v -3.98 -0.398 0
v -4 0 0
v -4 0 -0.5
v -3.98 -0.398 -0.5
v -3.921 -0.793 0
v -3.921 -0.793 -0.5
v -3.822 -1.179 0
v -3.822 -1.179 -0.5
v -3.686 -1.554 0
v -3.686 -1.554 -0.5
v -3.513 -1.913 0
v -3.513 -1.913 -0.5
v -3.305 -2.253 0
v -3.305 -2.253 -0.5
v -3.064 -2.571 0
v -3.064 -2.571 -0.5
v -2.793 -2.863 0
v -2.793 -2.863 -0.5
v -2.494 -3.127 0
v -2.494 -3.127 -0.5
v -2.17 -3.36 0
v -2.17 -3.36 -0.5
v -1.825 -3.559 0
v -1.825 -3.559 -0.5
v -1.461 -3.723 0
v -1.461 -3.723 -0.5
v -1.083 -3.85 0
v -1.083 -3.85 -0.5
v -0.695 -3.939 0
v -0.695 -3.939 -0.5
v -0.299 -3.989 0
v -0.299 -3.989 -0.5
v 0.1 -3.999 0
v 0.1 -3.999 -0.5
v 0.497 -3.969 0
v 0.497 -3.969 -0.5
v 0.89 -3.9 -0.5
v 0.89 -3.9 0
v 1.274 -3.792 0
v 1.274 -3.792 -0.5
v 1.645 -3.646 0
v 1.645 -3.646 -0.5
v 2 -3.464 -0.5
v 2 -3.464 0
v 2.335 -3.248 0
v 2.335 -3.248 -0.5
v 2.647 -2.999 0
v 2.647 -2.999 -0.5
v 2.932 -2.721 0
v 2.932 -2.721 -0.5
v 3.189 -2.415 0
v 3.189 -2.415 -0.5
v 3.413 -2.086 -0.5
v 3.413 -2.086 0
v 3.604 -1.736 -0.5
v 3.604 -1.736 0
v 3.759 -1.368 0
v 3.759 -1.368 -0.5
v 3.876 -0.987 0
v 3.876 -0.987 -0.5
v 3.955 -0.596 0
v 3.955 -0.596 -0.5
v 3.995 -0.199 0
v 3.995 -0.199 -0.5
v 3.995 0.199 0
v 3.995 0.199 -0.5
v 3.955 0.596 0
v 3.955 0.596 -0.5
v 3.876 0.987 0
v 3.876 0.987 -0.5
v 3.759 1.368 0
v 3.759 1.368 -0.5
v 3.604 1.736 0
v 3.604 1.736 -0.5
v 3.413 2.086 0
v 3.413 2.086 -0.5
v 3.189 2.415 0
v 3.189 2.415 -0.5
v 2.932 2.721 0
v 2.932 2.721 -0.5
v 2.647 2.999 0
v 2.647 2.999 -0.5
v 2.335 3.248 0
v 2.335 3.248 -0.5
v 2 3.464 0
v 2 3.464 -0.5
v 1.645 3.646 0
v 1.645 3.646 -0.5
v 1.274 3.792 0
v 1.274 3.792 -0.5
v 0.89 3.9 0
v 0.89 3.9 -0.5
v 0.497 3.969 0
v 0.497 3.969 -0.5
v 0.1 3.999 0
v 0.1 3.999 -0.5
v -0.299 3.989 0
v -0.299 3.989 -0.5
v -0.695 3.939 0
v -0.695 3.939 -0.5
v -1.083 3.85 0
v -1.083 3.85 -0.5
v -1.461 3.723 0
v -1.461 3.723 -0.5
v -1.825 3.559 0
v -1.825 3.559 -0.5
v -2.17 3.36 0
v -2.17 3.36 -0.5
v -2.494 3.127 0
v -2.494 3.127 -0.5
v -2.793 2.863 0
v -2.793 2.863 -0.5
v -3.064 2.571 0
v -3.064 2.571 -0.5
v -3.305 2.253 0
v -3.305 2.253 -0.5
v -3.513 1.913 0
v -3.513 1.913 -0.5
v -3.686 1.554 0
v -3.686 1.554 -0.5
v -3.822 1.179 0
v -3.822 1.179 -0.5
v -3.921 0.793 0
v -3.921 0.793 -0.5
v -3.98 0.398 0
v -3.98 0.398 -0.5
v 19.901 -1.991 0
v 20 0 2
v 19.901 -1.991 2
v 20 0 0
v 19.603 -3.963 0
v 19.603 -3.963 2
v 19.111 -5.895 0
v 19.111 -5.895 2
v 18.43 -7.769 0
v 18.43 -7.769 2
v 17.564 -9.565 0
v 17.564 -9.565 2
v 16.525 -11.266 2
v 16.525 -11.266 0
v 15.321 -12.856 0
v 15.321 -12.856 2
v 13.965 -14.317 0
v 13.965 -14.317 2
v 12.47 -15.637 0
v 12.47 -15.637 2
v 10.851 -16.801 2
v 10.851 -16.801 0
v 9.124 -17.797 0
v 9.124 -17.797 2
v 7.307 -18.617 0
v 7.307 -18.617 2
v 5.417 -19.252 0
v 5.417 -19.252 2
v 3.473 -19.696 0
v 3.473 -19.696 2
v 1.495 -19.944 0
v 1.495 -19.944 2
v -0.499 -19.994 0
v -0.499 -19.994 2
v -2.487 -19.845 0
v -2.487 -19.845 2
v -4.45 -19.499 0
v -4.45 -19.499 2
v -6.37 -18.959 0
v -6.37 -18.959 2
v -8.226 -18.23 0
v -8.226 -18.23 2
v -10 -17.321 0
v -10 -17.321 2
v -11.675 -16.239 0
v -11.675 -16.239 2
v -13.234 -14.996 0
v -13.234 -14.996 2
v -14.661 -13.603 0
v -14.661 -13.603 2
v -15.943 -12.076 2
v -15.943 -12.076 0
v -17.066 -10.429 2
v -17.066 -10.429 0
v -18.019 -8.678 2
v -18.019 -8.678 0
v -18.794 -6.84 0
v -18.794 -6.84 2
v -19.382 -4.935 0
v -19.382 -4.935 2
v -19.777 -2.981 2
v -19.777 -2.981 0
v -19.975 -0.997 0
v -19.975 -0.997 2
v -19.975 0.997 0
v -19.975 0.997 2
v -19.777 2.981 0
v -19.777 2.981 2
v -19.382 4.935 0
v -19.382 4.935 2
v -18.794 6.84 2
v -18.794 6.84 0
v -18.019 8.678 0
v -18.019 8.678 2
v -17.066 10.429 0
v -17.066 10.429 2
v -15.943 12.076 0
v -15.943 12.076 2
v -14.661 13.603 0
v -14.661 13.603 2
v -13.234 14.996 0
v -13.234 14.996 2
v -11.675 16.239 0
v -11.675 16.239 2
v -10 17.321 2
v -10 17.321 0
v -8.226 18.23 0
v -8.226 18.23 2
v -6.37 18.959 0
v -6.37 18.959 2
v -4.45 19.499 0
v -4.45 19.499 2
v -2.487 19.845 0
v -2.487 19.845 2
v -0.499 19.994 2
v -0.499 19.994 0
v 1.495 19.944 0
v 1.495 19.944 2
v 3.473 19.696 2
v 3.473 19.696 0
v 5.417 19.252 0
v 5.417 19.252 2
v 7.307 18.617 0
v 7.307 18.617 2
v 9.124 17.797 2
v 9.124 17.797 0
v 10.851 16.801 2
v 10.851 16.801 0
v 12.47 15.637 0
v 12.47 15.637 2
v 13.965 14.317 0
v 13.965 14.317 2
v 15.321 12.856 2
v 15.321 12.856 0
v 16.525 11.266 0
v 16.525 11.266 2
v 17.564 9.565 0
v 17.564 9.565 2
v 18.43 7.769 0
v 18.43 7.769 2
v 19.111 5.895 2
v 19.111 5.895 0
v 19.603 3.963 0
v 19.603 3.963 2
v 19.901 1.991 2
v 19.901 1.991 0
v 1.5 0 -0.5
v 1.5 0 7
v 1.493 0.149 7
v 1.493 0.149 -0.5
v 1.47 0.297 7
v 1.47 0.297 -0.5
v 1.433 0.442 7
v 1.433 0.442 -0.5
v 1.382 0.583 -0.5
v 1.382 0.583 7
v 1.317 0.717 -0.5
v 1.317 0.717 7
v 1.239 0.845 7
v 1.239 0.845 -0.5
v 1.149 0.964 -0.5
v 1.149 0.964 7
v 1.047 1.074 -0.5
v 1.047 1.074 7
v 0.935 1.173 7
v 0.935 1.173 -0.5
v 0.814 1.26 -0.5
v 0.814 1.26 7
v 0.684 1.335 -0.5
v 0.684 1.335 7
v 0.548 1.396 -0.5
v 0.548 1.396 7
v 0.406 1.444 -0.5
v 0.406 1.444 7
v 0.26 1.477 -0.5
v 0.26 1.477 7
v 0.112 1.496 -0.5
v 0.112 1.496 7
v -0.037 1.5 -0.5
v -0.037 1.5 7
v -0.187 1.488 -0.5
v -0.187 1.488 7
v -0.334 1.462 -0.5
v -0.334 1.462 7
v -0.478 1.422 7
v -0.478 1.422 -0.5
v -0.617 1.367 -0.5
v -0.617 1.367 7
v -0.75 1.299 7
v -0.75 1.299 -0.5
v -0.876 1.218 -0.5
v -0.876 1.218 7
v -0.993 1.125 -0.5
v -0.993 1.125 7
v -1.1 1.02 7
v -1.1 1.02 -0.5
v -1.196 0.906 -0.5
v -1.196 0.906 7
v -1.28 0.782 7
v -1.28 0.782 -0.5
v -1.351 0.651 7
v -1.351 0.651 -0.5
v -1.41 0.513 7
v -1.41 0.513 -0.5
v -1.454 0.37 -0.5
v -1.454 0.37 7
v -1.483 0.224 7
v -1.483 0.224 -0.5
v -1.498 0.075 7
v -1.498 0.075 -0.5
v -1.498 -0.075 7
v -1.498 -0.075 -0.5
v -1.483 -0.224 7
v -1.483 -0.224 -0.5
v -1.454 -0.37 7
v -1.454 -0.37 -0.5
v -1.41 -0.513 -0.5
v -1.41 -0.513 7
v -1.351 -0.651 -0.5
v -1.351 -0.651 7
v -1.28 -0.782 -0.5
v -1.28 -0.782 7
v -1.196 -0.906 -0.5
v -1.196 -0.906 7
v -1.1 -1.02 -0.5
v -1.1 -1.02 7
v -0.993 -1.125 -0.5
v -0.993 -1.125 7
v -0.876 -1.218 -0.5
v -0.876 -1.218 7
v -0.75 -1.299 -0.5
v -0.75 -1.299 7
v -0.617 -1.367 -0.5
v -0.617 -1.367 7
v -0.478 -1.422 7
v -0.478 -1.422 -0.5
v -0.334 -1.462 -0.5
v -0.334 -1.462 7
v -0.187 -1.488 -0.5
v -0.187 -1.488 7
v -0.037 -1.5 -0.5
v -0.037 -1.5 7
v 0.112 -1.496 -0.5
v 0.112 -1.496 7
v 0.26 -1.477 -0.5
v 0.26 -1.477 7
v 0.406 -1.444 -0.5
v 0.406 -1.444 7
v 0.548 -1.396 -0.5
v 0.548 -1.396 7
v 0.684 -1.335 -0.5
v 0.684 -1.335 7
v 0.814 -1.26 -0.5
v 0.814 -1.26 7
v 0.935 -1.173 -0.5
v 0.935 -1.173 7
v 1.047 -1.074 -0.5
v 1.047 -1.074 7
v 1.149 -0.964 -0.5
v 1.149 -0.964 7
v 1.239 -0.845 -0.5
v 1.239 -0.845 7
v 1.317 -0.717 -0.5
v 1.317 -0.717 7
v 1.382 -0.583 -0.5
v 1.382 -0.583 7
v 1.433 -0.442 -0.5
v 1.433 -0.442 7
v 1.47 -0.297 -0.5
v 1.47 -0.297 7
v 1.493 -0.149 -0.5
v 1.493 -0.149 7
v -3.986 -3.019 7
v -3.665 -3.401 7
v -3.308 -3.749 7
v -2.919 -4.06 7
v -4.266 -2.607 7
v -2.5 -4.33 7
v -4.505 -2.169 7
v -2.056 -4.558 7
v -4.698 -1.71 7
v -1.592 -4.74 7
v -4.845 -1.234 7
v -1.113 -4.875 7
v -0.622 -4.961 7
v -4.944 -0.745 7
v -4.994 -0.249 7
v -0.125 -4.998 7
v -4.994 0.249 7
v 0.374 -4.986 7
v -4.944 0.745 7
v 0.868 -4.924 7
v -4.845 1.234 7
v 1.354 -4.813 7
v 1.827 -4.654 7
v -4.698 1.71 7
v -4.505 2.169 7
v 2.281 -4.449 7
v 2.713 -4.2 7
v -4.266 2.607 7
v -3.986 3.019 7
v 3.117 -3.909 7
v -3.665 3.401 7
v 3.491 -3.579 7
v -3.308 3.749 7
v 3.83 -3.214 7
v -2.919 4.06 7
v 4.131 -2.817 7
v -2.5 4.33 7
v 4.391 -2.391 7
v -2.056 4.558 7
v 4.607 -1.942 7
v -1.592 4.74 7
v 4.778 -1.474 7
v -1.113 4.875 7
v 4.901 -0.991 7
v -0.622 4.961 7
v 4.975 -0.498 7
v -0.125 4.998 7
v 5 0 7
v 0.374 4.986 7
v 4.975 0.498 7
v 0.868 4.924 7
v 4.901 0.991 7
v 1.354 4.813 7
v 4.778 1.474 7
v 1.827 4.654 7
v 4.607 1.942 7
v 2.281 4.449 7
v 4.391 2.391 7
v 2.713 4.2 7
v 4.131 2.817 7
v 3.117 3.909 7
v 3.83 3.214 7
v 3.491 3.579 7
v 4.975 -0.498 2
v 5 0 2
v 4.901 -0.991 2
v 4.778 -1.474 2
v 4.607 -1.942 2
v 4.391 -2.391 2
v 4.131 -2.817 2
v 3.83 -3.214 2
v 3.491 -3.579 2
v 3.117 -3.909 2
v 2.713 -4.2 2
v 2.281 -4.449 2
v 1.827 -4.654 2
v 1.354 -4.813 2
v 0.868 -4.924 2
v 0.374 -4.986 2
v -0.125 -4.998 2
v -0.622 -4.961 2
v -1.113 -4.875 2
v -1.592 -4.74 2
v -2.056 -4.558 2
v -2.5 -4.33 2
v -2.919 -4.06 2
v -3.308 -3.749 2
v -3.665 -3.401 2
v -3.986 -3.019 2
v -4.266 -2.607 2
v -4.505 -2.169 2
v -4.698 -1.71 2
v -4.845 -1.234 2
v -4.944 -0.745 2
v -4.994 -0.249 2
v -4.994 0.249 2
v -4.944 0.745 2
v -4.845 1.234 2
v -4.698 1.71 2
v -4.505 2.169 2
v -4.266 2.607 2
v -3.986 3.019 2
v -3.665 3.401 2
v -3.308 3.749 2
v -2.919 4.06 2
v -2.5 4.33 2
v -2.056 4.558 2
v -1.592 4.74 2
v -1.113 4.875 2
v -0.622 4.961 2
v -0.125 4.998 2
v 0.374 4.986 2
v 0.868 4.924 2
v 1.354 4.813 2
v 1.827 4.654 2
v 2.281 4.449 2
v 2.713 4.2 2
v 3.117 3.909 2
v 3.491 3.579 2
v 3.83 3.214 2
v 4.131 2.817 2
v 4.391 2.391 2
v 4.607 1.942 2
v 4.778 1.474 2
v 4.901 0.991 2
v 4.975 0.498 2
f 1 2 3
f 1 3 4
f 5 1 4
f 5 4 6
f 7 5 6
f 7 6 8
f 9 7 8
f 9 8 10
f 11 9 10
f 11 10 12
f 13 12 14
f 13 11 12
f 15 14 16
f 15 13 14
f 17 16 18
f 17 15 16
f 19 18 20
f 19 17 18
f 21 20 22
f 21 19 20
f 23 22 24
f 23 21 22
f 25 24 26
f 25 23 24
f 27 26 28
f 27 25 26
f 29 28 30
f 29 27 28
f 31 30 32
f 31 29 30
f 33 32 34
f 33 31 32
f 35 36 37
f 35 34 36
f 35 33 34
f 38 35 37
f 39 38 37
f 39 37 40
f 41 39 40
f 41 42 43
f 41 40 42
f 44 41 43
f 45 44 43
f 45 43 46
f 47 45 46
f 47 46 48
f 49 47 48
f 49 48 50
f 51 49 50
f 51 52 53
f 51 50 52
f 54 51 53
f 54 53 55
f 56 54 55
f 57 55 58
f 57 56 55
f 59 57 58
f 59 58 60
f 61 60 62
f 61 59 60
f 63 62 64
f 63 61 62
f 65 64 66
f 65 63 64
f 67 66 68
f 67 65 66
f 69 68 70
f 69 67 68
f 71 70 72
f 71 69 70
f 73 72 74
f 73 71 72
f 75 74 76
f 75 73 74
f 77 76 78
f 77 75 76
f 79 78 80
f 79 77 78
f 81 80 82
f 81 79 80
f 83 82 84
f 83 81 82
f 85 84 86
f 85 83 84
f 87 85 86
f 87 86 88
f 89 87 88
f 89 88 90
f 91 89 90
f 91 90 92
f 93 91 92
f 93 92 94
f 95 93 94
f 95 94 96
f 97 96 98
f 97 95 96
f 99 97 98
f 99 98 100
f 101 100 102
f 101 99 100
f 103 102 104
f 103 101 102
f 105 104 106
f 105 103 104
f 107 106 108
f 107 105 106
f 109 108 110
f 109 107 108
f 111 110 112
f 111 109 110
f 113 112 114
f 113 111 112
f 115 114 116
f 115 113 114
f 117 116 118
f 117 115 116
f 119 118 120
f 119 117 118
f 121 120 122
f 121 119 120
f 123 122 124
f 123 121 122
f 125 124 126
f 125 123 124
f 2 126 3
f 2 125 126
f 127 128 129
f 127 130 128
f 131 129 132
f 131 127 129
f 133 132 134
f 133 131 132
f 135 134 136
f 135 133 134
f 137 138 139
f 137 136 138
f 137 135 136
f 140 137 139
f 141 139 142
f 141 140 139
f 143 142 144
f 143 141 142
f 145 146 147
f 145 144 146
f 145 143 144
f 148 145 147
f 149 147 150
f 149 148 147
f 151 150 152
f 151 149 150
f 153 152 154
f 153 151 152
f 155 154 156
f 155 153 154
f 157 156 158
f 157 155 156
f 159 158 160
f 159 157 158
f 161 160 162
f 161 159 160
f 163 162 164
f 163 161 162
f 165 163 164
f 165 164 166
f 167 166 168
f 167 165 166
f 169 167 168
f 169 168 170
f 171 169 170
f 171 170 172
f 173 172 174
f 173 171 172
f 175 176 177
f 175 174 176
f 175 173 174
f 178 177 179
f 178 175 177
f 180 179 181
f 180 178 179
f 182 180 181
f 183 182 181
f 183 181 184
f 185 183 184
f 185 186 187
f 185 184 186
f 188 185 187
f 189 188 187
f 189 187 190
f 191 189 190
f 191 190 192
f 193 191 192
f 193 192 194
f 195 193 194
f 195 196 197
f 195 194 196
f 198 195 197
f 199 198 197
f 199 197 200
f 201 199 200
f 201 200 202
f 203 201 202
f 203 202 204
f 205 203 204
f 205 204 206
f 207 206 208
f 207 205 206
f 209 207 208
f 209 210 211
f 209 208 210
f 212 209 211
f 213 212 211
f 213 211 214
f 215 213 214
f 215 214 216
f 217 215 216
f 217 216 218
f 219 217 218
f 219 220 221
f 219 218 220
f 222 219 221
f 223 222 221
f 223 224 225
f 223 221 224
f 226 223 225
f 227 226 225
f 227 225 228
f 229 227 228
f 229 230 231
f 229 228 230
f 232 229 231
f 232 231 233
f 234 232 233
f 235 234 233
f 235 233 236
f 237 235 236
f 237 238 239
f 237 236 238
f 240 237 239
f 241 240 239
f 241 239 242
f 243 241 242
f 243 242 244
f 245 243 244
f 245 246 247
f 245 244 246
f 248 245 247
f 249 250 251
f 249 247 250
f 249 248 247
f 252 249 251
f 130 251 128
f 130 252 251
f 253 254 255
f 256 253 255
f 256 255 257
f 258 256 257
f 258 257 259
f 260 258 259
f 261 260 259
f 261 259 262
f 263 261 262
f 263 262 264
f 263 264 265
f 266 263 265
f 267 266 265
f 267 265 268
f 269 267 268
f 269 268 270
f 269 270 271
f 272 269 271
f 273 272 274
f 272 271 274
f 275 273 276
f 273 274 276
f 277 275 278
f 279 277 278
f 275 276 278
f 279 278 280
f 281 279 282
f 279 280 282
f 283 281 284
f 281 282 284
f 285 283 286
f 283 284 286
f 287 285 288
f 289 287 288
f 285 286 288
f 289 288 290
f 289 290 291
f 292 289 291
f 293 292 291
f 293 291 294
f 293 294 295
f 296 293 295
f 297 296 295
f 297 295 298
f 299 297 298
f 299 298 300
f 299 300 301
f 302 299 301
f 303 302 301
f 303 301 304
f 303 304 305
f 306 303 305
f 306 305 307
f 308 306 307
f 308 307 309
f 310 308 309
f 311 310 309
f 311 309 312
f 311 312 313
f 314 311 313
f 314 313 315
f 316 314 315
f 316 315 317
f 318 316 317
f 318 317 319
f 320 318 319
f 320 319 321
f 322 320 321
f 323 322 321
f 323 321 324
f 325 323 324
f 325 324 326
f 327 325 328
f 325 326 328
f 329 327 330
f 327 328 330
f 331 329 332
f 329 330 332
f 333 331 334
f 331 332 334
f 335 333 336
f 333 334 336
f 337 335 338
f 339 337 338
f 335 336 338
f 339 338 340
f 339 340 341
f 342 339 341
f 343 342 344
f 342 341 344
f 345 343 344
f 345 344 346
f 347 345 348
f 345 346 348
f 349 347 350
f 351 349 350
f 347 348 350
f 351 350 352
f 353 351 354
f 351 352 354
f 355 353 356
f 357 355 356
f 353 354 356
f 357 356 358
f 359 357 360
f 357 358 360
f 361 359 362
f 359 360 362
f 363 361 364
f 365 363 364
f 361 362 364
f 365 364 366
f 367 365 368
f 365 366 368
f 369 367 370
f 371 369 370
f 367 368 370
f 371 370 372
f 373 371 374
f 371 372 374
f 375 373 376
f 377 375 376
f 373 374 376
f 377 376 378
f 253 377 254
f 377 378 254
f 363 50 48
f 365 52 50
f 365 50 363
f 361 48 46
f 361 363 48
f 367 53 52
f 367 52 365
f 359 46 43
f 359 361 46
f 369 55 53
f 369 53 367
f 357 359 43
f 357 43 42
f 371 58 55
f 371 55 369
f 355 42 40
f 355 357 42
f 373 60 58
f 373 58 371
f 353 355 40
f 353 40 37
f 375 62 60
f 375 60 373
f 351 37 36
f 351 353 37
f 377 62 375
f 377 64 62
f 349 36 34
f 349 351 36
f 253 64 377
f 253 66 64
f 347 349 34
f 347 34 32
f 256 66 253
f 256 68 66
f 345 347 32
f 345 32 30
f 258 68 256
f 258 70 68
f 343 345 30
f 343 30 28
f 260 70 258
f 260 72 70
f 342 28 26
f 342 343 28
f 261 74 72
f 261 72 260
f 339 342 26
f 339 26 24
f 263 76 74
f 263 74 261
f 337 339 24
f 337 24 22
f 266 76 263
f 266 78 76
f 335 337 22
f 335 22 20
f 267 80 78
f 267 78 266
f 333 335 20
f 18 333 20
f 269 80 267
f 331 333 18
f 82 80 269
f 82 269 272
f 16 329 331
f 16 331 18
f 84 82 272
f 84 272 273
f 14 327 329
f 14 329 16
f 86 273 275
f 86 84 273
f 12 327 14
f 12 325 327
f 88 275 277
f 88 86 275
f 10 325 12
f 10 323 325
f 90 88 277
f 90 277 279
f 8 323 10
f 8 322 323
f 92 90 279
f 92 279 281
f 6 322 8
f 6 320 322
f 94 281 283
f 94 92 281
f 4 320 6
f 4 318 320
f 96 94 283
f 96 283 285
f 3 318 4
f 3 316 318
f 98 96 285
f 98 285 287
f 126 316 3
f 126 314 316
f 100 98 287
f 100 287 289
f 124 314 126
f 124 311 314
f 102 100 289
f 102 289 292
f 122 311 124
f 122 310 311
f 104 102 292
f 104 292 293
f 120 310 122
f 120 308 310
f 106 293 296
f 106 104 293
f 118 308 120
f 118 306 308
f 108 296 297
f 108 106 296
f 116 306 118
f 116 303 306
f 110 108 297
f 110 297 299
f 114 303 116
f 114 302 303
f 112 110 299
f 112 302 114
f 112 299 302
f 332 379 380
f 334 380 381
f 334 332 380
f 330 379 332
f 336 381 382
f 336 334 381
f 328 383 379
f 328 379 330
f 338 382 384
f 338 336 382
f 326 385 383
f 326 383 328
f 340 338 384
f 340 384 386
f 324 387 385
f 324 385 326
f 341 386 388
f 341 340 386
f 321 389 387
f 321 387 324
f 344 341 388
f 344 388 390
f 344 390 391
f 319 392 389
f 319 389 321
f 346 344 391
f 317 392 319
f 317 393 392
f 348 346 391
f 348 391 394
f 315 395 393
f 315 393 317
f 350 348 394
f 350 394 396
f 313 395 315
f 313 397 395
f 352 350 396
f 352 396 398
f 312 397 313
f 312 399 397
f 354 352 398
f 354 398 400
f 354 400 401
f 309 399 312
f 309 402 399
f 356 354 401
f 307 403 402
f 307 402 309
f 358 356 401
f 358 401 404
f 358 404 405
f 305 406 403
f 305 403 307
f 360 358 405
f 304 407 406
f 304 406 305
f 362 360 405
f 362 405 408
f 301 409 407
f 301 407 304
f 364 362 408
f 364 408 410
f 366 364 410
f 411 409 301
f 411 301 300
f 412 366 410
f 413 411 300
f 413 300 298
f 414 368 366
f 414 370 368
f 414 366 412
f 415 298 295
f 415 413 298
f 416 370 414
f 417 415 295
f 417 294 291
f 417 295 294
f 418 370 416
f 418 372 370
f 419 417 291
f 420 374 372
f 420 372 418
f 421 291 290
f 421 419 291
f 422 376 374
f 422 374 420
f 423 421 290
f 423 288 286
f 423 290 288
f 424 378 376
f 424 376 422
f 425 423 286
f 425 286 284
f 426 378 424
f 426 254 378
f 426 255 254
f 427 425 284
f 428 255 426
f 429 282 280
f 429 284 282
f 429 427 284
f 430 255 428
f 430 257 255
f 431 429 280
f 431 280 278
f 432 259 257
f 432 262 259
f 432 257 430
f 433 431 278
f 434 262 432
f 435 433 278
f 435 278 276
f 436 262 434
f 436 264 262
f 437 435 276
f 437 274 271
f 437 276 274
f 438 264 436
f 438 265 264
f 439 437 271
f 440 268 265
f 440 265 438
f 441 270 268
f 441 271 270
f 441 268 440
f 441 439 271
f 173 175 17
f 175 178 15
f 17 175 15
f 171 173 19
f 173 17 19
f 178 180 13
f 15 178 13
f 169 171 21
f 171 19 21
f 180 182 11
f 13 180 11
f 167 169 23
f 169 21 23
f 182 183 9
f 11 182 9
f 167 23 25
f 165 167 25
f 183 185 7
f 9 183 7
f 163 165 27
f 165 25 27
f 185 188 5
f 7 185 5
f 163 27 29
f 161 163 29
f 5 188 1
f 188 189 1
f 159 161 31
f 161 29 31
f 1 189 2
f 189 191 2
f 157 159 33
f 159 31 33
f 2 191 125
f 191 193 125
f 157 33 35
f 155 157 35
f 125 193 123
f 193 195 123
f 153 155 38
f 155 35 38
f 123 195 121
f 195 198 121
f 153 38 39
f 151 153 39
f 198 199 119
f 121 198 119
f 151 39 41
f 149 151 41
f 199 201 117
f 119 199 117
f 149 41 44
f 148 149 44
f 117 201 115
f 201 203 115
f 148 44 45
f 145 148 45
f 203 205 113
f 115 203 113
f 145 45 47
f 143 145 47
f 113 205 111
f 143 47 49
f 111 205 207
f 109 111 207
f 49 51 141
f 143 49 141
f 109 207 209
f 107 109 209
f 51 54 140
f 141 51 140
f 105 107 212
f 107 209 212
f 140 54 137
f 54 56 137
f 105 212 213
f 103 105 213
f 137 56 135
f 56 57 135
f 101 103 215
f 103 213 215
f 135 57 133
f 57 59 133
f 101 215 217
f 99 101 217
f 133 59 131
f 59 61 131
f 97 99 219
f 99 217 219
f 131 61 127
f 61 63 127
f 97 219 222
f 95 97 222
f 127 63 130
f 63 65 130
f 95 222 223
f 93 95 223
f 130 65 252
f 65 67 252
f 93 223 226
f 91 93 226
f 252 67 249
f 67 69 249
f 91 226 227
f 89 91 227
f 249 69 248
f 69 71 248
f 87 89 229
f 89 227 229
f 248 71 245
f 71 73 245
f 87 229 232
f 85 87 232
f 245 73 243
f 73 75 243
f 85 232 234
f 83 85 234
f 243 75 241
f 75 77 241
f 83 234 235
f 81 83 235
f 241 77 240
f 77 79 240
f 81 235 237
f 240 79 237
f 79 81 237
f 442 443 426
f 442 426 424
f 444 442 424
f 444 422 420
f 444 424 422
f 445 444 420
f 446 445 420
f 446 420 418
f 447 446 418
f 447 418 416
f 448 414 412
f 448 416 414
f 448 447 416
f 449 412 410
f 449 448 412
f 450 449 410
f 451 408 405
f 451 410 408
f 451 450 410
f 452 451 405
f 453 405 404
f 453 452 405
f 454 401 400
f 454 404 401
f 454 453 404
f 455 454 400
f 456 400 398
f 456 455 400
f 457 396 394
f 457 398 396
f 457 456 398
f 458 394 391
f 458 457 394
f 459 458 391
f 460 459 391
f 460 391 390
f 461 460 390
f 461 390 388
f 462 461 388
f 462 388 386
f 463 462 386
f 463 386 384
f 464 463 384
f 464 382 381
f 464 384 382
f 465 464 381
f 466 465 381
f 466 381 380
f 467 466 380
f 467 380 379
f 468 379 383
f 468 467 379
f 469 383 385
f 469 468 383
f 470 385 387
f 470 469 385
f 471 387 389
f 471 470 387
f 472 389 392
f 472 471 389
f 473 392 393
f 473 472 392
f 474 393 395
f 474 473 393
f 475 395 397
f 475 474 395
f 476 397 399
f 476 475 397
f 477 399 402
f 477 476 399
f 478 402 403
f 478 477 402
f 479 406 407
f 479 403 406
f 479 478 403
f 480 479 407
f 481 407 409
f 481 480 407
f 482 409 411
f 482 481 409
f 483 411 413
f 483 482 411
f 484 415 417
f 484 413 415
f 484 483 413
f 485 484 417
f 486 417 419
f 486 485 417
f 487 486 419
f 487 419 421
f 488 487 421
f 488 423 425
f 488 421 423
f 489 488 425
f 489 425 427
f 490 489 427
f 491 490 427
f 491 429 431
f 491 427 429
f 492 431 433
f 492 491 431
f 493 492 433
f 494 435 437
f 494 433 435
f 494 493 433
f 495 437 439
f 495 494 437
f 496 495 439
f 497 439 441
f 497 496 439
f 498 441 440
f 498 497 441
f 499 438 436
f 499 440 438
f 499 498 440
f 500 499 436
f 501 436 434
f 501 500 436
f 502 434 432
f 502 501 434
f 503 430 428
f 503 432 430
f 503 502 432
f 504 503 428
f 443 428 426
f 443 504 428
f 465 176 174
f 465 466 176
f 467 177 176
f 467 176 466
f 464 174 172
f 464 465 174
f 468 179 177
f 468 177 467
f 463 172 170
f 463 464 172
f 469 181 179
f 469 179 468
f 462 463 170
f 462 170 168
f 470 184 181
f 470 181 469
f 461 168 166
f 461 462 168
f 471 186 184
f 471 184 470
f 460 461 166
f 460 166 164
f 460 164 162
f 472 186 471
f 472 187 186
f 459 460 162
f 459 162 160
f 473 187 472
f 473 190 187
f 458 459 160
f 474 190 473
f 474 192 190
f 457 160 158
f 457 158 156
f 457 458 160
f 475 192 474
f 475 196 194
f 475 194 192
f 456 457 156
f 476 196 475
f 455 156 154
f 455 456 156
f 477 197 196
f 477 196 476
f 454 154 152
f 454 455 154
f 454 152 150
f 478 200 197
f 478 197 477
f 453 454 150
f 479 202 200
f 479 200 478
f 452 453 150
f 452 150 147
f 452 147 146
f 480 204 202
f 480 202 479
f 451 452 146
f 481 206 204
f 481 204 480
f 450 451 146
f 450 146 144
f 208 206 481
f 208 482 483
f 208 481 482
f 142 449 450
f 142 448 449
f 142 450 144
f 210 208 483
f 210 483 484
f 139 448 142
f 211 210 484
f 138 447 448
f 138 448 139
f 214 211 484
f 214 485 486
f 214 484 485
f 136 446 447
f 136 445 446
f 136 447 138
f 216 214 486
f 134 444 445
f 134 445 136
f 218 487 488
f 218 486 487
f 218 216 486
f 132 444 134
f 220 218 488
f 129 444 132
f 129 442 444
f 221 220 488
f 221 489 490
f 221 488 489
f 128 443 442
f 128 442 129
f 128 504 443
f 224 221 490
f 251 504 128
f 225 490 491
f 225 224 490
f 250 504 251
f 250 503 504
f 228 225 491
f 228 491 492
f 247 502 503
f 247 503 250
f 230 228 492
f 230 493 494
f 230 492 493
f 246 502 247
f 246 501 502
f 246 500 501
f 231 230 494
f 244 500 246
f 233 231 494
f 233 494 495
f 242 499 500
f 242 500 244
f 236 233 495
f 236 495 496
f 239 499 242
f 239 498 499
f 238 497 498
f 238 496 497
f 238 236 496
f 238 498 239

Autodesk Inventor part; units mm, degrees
ref_plane "YZ Plane" through (0, 0, 0) normal (1, 0, 0) x (0, 1, 0)
ref_plane "XZ Plane" through (0, 0, 0) normal (0, 1, 0) x (-1, 0, 0)
ref_plane "XY Plane" through (0, 0, 0) normal (0, 0, 1) x (1, 0, 0)
sketch "スケッチ4" plane through (0, 0, 0) normal (0, 0, 1) x (1, 0, 0)
  circle A0 centre (0, 0) radius 20
  dimension "d22" = 40
extrude "押し出し3" add sketch "スケッチ4" along normal blind 2
sketch "スケッチ5" plane through (0, 0, 2) normal (0, 0, 1) x (1, 0, 0)
  circle A0 centre (0, 0) radius 5
  dimension "d25" = 10
extrude "押し出し4" add sketch "スケッチ5" along normal blind 5
sketch "スケッチ6" plane through (0, 0, 0) normal (0, 0, -1) x (-1, 0, 0)
  circle A0 centre (0, 0) radius 4
  dimension "d28" = 8
extrude "押し出し5" add sketch "スケッチ6" along normal blind 0.5
sketch "スケッチ7" plane through (0, 0, 7) normal (0, 0, 1) x (1, 0, 0)
  circle A0 centre (0, 0) radius 1.5
  dimension "d31" = 3
extrude "押し出し6" cut sketch "スケッチ7" against normal blind 10
properties part number "Gear4_S50B 80B+0203" material "真鍮"
